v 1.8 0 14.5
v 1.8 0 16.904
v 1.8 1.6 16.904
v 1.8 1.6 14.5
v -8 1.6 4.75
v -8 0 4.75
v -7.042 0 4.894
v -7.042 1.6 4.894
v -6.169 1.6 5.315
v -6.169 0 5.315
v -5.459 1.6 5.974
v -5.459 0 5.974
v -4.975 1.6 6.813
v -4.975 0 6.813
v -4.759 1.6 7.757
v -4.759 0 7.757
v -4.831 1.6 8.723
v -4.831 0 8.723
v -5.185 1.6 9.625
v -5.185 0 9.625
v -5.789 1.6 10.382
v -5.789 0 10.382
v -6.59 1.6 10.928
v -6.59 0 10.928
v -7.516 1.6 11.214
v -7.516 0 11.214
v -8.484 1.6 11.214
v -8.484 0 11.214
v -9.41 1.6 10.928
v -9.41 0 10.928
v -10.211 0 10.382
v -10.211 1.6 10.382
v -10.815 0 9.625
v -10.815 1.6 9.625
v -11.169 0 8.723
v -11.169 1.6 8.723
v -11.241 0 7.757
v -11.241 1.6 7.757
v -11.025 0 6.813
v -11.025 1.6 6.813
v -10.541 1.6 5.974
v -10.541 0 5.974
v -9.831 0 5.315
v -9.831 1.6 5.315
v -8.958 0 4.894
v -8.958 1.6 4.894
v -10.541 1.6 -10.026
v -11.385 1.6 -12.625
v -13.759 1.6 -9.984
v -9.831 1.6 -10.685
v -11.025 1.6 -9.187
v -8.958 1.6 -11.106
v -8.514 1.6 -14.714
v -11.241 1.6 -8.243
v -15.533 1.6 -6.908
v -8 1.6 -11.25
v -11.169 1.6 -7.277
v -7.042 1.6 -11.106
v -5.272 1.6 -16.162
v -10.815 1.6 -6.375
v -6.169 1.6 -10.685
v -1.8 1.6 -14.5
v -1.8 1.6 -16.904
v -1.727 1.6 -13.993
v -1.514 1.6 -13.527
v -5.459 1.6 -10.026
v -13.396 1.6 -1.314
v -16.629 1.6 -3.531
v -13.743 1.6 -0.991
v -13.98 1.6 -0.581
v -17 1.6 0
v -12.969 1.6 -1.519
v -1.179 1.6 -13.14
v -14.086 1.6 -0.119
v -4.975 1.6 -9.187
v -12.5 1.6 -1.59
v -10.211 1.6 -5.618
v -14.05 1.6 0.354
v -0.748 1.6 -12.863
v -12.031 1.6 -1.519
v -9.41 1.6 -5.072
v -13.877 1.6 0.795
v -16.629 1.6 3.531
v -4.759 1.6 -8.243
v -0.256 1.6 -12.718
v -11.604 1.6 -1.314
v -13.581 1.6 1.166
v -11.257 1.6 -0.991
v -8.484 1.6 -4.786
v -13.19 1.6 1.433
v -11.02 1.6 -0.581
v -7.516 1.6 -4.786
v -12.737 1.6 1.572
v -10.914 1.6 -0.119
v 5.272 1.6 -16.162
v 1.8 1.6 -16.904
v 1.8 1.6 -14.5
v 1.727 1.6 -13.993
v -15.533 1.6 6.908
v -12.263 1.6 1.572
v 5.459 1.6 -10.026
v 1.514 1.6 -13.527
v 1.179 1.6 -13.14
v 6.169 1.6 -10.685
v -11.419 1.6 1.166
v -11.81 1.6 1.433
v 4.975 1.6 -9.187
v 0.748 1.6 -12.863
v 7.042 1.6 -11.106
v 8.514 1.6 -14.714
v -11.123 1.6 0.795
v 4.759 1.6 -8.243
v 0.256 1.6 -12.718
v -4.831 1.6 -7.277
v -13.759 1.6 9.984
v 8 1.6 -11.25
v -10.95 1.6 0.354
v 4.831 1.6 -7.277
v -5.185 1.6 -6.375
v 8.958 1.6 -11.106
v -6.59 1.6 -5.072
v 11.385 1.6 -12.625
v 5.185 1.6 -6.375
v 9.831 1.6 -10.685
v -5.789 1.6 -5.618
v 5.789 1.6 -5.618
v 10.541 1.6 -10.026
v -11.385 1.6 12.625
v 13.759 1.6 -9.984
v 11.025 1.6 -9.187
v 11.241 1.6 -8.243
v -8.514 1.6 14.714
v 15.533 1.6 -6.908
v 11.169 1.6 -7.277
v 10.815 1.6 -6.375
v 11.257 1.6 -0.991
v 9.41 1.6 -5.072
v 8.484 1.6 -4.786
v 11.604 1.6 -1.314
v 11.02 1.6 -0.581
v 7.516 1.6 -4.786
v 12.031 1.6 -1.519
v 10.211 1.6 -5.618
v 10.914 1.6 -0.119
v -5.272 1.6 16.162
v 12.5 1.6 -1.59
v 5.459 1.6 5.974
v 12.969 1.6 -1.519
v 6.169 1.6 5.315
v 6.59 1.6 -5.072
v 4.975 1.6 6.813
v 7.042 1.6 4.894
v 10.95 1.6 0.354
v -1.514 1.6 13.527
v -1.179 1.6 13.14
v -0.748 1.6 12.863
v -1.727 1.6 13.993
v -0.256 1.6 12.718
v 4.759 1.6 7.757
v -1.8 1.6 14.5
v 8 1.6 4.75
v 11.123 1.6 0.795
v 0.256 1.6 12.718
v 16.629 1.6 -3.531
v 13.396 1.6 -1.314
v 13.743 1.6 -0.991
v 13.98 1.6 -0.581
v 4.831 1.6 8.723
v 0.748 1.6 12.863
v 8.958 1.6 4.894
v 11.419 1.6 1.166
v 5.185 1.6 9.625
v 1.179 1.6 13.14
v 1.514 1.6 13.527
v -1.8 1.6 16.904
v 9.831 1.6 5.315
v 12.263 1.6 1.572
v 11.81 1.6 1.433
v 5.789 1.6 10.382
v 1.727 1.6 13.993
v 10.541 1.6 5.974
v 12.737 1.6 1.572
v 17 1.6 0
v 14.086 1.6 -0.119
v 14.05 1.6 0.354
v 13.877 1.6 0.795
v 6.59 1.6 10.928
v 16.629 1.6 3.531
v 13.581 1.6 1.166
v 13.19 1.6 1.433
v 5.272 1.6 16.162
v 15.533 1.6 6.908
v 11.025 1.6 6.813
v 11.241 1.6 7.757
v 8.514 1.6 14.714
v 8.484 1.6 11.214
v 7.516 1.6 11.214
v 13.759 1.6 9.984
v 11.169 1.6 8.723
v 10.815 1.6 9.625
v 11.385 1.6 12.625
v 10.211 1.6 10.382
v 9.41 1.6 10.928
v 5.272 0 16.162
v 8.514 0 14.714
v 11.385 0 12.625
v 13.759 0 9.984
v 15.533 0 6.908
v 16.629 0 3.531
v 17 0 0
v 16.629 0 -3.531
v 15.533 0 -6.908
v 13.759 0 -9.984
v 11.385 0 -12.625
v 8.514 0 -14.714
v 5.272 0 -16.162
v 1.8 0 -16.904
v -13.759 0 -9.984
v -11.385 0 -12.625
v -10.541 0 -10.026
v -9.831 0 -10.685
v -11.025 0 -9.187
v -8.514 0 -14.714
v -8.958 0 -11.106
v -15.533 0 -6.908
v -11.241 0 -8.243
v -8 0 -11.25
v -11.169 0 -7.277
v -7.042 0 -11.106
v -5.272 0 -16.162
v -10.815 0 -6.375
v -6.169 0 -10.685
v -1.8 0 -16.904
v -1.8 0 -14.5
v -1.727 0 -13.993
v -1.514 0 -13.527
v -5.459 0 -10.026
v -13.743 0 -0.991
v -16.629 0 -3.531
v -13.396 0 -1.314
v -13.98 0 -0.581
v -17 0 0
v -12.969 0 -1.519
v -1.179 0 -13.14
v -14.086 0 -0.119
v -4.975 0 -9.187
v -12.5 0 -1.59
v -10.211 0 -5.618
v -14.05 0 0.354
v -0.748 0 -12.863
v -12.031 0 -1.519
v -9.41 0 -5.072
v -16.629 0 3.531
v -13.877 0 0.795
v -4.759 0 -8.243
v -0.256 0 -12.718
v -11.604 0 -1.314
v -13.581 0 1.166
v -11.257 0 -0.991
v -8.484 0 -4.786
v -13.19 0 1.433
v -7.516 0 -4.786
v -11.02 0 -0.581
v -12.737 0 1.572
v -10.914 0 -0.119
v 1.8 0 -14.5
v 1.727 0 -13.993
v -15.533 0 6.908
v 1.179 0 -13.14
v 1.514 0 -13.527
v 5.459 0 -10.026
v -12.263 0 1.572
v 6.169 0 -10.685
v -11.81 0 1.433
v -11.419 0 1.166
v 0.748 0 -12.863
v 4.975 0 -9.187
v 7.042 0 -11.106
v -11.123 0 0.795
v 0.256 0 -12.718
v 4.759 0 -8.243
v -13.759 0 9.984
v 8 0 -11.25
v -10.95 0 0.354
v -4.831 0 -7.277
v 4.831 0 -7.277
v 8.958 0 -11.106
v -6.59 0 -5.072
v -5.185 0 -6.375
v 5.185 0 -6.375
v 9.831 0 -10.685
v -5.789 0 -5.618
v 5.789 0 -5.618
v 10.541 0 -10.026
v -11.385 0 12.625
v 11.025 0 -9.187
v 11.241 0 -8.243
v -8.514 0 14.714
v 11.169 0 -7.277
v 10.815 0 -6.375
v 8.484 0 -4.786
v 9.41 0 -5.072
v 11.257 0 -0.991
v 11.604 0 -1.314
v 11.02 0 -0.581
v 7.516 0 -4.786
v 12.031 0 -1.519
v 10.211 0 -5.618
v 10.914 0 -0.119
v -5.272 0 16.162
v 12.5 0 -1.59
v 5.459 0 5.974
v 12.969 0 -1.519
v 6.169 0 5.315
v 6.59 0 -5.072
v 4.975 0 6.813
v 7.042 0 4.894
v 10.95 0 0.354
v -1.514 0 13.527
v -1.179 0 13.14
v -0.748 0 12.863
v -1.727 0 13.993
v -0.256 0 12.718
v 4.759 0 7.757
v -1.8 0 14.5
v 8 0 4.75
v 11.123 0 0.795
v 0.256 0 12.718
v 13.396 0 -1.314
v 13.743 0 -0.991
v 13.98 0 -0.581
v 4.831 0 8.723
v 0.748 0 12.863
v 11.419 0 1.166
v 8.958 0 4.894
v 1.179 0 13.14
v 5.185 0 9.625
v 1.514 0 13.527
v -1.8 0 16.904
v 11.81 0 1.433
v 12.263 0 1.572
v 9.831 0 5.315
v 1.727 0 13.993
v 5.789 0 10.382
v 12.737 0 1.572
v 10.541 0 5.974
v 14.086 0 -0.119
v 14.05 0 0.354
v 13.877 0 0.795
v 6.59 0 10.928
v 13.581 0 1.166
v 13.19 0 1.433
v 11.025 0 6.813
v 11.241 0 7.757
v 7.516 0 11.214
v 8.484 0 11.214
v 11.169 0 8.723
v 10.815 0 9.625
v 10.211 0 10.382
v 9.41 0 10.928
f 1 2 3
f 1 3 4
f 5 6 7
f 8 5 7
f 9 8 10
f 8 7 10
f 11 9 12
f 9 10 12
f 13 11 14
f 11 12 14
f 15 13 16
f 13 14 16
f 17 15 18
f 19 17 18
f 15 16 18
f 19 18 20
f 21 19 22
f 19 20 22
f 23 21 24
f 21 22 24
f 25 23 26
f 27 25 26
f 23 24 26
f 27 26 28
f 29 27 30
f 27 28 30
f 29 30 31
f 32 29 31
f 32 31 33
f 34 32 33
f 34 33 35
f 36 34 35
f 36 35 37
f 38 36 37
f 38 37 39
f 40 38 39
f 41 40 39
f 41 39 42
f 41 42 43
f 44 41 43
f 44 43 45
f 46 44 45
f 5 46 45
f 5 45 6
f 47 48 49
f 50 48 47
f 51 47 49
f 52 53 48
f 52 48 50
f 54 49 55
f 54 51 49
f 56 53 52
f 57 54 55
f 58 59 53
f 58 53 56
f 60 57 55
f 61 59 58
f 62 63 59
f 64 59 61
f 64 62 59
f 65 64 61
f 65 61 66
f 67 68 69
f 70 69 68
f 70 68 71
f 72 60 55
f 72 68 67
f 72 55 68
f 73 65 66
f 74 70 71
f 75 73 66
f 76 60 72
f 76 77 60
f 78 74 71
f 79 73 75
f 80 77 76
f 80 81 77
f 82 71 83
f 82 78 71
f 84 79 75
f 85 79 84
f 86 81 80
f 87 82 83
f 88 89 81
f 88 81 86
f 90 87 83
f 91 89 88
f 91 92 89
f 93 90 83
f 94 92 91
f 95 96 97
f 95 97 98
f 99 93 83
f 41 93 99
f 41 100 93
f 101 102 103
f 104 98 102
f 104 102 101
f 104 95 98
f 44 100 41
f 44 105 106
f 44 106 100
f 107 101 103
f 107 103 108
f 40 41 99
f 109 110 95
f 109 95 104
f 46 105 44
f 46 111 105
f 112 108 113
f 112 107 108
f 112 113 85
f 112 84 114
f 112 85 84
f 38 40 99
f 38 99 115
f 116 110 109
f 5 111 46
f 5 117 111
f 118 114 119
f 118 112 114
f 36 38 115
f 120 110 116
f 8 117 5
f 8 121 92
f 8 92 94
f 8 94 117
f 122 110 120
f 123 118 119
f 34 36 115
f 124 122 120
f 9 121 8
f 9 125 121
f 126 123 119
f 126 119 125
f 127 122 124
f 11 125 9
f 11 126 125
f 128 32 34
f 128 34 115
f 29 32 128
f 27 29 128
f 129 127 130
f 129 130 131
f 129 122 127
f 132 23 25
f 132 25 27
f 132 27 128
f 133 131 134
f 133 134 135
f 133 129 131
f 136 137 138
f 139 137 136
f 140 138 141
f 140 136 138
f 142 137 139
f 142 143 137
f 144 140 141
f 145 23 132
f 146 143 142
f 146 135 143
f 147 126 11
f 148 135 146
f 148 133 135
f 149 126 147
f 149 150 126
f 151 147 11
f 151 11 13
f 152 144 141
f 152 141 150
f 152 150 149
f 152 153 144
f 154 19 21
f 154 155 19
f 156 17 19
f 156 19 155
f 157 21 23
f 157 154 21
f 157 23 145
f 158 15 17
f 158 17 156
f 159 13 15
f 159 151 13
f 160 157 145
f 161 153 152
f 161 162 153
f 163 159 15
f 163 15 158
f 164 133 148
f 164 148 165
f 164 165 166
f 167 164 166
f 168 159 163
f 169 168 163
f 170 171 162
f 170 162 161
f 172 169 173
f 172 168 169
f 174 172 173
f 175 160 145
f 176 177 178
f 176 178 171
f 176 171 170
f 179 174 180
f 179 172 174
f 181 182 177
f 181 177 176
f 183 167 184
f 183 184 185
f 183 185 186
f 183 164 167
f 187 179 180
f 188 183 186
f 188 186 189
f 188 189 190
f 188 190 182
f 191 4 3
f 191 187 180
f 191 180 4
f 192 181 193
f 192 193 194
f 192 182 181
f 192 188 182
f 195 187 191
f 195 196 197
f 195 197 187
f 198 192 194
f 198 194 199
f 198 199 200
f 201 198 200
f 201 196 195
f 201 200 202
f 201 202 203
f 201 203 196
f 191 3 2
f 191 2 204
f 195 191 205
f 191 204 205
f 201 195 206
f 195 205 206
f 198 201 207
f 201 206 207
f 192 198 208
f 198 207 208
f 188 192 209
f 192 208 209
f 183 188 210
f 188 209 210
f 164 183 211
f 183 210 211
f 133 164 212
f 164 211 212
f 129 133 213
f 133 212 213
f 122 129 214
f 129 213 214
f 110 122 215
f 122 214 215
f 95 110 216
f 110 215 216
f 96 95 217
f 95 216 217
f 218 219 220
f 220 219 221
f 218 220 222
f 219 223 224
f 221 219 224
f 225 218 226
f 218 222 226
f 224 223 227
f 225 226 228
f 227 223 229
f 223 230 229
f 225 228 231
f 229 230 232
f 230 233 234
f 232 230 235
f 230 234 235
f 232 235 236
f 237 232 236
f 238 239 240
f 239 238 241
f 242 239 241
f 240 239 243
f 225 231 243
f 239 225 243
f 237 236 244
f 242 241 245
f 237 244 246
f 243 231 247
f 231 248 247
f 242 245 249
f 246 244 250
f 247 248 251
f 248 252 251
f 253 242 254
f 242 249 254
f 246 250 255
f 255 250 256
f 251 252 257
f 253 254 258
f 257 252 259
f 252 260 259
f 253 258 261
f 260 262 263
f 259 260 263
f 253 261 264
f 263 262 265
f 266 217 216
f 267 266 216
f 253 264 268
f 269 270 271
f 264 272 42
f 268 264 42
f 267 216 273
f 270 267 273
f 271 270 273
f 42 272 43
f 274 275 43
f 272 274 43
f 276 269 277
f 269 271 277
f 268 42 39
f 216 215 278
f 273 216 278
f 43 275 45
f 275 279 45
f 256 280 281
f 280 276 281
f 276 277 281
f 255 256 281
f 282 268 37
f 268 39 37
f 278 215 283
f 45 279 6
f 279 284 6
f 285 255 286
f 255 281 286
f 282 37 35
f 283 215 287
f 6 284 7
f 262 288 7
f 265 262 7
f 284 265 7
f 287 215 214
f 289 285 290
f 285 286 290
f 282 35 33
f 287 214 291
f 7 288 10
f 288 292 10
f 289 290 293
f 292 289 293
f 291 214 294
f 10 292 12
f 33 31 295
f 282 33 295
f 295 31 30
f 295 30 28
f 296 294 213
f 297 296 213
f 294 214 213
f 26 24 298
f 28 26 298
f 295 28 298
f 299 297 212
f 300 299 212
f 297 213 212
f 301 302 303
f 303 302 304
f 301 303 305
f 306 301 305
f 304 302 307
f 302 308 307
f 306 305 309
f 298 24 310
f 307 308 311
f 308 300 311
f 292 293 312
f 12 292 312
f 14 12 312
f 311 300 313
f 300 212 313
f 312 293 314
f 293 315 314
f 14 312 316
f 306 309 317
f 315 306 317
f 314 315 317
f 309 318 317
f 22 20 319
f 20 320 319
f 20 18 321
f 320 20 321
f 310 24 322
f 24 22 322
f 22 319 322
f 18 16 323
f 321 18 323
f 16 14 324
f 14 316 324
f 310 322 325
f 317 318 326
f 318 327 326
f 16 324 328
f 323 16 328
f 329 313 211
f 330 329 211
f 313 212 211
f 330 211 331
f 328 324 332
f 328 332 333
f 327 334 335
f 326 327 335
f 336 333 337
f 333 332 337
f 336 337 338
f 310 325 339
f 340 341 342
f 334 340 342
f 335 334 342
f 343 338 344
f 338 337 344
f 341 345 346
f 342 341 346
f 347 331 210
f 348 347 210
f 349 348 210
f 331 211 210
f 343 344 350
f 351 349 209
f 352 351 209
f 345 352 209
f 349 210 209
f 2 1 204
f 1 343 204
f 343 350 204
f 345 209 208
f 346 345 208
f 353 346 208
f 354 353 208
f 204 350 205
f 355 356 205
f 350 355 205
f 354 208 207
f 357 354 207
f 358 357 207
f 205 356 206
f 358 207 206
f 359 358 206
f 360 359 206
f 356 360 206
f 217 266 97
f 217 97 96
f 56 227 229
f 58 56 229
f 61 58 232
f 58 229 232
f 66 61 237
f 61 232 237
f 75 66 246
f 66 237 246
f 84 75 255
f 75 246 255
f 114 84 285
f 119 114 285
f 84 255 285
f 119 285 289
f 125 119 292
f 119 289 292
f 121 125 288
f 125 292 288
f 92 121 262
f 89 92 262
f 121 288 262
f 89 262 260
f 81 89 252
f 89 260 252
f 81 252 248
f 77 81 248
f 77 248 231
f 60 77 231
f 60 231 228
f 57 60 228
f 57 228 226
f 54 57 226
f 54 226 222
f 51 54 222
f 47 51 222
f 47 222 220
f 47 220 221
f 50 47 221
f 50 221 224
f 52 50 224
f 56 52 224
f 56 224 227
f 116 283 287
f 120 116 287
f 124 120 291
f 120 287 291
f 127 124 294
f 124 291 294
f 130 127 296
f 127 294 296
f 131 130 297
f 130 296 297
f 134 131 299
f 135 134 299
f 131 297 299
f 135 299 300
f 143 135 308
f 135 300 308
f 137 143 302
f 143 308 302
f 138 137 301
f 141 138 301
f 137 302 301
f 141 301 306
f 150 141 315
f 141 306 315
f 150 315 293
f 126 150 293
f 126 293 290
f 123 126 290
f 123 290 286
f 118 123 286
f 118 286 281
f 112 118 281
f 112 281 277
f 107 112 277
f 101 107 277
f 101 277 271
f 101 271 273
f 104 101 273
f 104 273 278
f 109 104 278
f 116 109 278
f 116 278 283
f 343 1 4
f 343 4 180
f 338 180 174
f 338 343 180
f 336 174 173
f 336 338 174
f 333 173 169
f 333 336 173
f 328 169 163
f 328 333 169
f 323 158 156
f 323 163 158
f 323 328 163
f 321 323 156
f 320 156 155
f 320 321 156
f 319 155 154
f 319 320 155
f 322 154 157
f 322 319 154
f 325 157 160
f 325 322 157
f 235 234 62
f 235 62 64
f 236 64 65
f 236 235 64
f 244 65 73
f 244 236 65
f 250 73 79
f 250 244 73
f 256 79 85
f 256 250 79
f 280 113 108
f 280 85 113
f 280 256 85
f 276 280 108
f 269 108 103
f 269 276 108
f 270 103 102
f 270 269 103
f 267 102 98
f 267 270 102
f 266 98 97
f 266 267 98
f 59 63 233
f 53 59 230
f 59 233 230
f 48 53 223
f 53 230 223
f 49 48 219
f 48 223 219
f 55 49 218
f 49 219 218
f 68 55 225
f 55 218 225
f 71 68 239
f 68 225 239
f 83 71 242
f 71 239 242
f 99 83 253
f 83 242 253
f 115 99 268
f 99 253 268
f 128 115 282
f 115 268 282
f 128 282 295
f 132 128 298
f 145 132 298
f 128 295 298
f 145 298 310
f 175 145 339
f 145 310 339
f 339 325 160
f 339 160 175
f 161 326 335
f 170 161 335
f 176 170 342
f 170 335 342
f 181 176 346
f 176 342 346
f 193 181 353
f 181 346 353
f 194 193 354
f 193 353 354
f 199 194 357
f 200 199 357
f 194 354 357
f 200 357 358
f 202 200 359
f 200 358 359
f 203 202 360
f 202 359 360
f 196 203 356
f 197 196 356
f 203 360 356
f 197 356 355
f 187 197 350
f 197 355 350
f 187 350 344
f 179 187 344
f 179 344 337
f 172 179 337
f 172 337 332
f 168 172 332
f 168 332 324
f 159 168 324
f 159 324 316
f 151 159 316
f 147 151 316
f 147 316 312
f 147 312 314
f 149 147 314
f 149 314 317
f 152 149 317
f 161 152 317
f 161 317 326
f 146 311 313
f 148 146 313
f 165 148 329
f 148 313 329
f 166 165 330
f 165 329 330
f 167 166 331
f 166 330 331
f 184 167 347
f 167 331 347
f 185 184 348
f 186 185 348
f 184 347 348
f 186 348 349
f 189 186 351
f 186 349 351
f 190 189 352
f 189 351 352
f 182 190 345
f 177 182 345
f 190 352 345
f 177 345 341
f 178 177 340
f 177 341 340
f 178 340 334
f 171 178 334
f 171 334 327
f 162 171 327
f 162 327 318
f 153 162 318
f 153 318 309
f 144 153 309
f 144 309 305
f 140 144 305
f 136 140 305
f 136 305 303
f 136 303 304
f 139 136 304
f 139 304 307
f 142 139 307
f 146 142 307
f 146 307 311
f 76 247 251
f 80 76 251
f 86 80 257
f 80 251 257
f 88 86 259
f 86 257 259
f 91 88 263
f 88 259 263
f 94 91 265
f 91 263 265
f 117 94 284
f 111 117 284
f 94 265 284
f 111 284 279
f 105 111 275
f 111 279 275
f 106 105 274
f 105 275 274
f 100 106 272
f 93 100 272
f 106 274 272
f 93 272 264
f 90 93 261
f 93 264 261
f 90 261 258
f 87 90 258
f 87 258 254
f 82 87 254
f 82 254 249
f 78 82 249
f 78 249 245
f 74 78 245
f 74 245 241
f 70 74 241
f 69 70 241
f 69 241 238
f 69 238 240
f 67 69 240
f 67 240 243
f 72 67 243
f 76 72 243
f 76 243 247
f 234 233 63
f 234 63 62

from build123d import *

# Parameters (mm, degrees)
SKETCH1_R           = 17
BOSS_EXTRUDE1_DEPTH = 1.6
SKETCH2_R           = 1.59
SKETCH2_R_2         = 3.25
CUT_EXTRUDE1_DEPTH  = 25.09481272


with BuildPart() as part:
    # Sketch1 → Boss-Extrude1 (new body)
    with BuildSketch(Plane(origin=(0, 0, 0), x_dir=(1, 0, 0), z_dir=(0, 1, 0))):
        with Locations(Location((0, 0, 0), (0, 0, 270))):
            Circle(SKETCH1_R)
    extrude(amount=BOSS_EXTRUDE1_DEPTH)

    # Sketch2 → Cut-Extrude1 (cut, through all)
    with BuildSketch(Plane.XZ):
        with Locations(Location((12.5, 0, 0), (0, 0, 270))):
            Circle(SKETCH2_R)
        with Locations(Location((-12.5, 0, 0), (0, 0, 270))):
            Circle(SKETCH2_R)
        with Locations(Location((8, 8, 0), (0, 0, 270))):
            Circle(SKETCH2_R_2)
        with Locations(Location((8, -8, 0), (0, 0, 270))):
            Circle(SKETCH2_R_2)
        with Locations(Location((-8, -8, 0), (0, 0, 270))):
            Circle(SKETCH2_R_2)
        with Locations(Location((-8, 8, 0), (0, 0, 270))):
            Circle(SKETCH2_R_2)
        with BuildLine():
            Line((-1.8, 14.5), (-1.8, 16.904437287))
            ThreePointArc((-1.8, 16.904437287), (0, 17), (1.8, 16.904437287))
            Line((1.8, 16.904437287), (1.8, 14.5))
            ThreePointArc((1.8, 14.5), (0, 12.7), (-1.8, 14.5))
        make_face()
        with BuildLine():
            Line((1.8, -14.5), (1.8, -16.904437287))
            ThreePointArc((1.8, -16.904437287), (0, -17), (-1.8, -16.904437287))
            Line((-1.8, -16.904437287), (-1.8, -14.5))
            ThreePointArc((-1.8, -14.5), (0, -12.7), (1.8, -14.5))
        make_face()
    extrude(amount=-CUT_EXTRUDE1_DEPTH, mode=Mode.SUBTRACT)


solid = part.part
